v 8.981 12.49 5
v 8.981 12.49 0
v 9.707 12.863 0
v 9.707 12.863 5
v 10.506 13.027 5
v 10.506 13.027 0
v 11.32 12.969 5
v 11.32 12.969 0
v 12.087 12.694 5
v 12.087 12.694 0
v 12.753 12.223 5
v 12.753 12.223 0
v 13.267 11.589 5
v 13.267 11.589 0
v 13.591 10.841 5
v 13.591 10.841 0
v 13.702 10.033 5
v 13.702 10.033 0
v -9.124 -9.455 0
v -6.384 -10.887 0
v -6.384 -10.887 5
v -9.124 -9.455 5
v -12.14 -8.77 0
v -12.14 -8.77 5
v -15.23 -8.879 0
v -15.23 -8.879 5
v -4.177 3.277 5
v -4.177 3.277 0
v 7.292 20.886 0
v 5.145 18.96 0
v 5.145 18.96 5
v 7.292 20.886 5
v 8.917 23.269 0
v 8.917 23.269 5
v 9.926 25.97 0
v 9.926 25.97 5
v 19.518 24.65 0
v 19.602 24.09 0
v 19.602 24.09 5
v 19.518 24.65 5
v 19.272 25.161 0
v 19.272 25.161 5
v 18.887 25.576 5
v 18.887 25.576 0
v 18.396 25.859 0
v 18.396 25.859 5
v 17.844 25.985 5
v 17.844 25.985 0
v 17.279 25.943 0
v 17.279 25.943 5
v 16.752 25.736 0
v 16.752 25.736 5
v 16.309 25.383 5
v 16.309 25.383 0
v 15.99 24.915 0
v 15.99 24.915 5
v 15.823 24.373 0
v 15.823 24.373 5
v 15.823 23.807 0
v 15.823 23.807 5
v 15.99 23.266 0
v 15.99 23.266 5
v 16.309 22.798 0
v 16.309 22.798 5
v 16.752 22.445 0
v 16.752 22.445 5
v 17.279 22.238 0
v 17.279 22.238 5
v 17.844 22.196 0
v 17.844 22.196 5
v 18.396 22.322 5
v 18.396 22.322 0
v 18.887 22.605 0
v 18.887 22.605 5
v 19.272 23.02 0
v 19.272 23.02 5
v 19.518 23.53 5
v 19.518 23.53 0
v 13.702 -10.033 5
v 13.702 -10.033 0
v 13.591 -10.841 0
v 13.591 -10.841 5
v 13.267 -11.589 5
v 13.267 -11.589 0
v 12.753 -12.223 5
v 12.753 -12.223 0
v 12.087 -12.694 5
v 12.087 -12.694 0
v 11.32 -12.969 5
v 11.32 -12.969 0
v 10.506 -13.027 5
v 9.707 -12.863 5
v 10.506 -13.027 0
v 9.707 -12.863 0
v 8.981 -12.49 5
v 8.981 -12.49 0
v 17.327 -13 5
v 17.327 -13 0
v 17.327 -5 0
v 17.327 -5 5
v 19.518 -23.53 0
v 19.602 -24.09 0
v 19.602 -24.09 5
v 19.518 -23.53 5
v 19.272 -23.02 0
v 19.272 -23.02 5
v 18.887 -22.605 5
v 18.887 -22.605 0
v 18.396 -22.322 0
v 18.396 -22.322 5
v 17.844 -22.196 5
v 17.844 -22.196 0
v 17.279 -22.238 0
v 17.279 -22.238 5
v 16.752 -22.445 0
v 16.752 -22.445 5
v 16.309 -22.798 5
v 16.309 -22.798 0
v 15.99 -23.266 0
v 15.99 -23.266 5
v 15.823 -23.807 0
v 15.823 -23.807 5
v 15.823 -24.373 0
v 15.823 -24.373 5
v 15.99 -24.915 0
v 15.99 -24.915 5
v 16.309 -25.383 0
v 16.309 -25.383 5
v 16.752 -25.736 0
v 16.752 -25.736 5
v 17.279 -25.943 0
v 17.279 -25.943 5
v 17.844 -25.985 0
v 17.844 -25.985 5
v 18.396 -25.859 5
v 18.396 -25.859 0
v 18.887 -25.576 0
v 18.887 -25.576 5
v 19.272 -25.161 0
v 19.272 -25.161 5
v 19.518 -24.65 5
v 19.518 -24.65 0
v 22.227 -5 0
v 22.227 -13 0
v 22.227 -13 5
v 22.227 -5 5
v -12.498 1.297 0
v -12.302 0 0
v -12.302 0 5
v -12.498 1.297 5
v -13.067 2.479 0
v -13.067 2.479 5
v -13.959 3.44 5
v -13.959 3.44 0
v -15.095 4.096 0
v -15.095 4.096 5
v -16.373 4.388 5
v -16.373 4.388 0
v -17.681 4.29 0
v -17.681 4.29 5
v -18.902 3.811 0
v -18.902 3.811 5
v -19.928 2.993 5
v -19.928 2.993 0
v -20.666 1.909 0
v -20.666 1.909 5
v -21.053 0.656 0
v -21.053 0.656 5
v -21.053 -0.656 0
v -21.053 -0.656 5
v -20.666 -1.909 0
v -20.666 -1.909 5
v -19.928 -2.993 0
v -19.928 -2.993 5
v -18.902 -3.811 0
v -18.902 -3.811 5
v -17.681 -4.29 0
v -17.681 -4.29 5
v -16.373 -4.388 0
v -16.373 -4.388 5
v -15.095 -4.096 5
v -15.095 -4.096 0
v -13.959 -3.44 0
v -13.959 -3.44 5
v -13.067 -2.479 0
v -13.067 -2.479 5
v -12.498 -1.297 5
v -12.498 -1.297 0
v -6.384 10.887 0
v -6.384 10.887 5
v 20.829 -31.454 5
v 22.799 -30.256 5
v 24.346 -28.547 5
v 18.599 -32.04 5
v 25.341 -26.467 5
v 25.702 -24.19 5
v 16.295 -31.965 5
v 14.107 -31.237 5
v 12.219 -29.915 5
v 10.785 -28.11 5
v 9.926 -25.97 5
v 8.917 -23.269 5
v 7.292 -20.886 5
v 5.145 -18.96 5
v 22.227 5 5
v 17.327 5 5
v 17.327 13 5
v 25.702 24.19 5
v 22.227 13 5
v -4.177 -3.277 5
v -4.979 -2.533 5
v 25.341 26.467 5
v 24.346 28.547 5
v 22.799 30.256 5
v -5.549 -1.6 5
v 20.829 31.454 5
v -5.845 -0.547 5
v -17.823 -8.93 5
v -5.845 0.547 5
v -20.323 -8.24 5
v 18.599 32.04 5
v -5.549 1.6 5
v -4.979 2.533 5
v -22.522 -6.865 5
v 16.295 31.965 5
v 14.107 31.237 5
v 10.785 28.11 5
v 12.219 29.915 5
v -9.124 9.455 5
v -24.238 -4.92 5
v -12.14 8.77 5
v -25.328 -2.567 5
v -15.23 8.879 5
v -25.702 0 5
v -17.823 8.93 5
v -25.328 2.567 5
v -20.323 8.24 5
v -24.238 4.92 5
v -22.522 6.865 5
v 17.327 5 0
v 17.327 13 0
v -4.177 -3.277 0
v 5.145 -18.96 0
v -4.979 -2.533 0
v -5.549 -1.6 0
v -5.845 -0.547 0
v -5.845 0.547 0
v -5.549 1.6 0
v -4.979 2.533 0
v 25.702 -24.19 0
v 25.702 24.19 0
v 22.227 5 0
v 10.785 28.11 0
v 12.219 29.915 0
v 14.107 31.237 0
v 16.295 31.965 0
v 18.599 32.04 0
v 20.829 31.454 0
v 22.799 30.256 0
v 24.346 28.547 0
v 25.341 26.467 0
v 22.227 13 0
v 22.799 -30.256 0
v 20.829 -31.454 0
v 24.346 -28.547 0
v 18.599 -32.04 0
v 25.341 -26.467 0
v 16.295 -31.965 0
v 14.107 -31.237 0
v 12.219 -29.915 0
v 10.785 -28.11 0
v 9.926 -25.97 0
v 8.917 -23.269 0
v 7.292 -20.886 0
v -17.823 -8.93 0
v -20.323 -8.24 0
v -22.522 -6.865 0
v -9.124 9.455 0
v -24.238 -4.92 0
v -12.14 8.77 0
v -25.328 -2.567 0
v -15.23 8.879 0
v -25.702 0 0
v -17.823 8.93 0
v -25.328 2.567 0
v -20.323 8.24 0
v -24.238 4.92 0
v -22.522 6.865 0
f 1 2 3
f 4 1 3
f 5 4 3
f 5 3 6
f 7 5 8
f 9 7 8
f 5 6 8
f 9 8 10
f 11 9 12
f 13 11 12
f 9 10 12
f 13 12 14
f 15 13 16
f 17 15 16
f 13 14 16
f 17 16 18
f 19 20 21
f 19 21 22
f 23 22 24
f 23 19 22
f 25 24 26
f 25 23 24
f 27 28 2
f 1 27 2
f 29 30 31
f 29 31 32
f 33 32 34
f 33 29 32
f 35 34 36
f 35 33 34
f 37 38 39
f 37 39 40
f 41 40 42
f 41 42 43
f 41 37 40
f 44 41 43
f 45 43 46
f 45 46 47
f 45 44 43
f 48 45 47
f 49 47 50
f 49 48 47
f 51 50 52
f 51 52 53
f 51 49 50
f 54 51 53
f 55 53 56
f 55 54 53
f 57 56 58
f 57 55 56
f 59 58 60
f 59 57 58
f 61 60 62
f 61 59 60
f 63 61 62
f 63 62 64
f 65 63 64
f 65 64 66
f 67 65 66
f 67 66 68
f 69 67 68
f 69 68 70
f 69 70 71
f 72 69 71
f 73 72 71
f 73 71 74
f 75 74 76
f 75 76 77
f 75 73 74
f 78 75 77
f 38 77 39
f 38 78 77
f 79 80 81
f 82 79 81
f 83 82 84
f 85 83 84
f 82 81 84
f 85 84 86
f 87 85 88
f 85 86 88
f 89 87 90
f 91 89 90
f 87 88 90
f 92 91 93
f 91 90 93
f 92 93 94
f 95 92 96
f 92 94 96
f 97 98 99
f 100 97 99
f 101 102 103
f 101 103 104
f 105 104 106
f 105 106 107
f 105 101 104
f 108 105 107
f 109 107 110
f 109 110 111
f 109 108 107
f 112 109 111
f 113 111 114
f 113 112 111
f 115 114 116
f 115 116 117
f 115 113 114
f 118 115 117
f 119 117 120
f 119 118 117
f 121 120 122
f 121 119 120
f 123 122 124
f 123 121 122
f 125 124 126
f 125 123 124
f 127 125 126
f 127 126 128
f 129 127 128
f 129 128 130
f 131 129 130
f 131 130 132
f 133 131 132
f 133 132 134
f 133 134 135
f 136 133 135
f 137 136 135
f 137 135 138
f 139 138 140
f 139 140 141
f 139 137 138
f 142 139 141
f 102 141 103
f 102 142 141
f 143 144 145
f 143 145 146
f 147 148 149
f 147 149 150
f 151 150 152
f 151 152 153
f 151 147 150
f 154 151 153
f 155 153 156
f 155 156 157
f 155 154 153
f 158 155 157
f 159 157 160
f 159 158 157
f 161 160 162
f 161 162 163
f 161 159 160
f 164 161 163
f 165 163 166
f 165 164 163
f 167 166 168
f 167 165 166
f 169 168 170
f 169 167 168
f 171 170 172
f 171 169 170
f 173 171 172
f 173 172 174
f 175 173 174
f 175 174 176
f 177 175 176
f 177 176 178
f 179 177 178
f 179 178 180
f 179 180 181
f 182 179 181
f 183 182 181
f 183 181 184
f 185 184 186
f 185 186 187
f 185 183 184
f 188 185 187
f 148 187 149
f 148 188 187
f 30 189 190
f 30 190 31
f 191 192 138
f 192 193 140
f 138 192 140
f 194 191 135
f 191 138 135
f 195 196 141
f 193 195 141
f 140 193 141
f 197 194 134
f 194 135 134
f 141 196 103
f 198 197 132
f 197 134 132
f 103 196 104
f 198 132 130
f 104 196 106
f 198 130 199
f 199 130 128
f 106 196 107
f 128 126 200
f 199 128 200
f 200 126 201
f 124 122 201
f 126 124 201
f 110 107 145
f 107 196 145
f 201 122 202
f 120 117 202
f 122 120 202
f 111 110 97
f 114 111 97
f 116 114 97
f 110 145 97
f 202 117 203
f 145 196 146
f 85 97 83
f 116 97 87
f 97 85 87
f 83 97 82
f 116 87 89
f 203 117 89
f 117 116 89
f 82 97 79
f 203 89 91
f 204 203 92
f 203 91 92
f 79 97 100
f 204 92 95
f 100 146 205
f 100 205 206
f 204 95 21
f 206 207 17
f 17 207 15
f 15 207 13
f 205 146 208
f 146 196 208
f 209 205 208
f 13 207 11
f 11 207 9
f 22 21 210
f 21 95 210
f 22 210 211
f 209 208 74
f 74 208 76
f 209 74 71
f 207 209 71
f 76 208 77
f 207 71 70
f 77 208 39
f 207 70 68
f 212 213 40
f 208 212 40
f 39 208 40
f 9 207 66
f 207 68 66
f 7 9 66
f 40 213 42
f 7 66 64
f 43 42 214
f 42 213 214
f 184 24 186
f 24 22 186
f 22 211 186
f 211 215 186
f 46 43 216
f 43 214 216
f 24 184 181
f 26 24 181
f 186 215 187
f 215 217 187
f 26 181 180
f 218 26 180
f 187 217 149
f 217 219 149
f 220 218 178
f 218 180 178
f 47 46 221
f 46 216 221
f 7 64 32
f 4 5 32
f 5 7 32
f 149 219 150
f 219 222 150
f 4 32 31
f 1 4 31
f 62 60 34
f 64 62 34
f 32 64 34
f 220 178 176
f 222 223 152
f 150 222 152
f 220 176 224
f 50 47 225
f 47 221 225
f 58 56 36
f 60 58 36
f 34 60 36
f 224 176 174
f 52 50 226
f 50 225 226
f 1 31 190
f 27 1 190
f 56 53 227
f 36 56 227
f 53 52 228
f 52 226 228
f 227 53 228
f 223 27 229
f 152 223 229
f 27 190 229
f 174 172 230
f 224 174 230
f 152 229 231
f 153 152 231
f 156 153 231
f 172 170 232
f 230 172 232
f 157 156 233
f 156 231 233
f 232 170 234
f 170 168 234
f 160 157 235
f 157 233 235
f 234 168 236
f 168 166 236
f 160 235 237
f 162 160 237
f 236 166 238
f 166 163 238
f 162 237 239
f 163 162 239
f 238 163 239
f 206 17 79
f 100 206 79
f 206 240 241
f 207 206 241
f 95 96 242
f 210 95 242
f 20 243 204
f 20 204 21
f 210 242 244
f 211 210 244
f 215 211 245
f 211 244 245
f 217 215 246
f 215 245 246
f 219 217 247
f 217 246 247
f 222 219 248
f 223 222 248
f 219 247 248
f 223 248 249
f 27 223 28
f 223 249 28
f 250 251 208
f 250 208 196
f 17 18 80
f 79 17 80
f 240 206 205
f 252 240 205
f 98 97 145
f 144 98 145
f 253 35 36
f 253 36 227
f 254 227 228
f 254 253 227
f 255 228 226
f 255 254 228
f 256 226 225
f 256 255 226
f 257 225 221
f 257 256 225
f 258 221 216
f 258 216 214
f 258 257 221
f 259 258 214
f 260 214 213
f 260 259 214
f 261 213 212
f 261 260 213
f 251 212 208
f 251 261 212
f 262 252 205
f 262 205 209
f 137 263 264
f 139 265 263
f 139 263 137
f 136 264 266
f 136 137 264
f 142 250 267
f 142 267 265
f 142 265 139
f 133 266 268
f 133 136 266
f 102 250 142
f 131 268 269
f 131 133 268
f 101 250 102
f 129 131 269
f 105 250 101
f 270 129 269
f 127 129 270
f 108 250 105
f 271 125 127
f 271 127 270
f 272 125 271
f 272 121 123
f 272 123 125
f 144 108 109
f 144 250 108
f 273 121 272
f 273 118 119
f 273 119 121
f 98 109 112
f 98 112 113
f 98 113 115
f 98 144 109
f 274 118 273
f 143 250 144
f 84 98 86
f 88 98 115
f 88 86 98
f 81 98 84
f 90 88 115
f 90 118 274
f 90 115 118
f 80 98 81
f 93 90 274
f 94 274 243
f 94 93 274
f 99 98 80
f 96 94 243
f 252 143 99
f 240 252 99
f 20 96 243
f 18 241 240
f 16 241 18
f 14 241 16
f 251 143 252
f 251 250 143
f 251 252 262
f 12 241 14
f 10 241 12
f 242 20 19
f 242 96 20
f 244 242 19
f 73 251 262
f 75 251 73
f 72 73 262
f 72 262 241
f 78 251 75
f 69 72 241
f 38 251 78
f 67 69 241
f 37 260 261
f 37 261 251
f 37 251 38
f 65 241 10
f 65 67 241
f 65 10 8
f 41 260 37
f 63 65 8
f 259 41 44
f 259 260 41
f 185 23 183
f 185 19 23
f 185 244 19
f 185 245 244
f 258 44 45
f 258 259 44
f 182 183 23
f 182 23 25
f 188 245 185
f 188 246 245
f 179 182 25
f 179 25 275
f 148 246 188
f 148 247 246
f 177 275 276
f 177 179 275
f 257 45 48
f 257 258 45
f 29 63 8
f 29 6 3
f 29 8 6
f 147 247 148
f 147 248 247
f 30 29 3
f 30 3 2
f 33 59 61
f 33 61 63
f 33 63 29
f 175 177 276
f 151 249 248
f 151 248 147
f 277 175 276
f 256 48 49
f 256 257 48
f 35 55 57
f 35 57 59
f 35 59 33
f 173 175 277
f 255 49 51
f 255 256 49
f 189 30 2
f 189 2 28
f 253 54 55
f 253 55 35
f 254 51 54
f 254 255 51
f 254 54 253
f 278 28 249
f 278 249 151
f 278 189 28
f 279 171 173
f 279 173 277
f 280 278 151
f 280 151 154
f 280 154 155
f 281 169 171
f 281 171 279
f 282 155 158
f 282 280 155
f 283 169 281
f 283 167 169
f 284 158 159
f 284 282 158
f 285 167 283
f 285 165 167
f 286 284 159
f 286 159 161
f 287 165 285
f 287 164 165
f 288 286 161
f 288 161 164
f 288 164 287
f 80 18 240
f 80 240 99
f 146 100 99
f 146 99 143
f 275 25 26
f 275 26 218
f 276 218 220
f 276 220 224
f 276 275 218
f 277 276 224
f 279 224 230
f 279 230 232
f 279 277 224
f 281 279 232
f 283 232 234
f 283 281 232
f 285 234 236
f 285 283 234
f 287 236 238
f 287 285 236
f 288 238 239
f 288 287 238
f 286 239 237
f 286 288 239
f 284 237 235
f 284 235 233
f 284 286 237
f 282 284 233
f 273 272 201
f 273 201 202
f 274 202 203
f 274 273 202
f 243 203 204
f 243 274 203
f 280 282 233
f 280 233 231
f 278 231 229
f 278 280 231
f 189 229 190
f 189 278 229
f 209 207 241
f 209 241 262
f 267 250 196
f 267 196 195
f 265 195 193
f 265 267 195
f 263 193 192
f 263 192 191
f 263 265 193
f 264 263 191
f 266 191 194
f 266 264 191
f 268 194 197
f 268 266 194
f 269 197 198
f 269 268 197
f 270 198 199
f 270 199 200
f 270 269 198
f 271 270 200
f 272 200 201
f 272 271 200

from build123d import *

# Parameters (mm, degrees)
ESQUISSE1_R        = 1.9
ESQUISSE1_R_2      = 4.4
ESQUISSE1_W        = 4.89999982
ESQUISSE1_H        = 8.00000038
BOSS_EXTRU_1_DEPTH = 5


with BuildPart() as part:
    # Esquisse1 → Boss.-Extru.1 (new body)
    with BuildSketch(Plane.XY):
        with BuildLine():
            Line((25.70156774, 24.190208374), (25.70156774, -24.190208374))
            ThreePointArc((25.70156774, -24.190208374), (18.599090239, -32.039774771), (9.926188952, -25.970041455))
            ThreePointArc((9.926188952, -25.970041455), (8.175930594, -22.028307987), (5.145100617, -18.959963694))
            Line((5.145100617, -18.959963694), (-6.383895202, -10.887273587))
            ThreePointArc((-6.383895202, -10.887273587), (-10.60979376, -9.014950874), (-15.229887052, -8.87875638))
            ThreePointArc((-15.229887052, -8.87875638), (-25.702193121, 0), (-15.229887052, 8.87875638))
            ThreePointArc((-15.229887052, 8.87875638), (-10.60979376, 9.014950873), (-6.383895202, 10.887273587))
            Line((-6.383895202, 10.887273587), (5.145100617, 18.959963694))
            ThreePointArc((5.145100617, 18.959963694), (8.175930651, 22.028307983), (9.926189014, 25.970041482))
            ThreePointArc((9.926189014, 25.970041482), (18.59909026, 32.03977477), (25.70156774, 24.190208374))
        make_face()
        with Locations((17.70219274, 24.090210327)):
            Circle(ESQUISSE1_R, mode=Mode.SUBTRACT)
        with Locations((17.70219274, -24.090210327)):
            Circle(ESQUISSE1_R, mode=Mode.SUBTRACT)
        with Locations((-16.70219312, 0)):
            Circle(ESQUISSE1_R_2, mode=Mode.SUBTRACT)
        with BuildLine():
            Line((8.98146324, -12.490403838), (-4.177200867, -3.276608186))
            ThreePointArc((-4.177200867, -3.276608186), (-5.882895134, 0), (-4.177200867, 3.276608186))
            Line((-4.177200867, 3.276608186), (8.98146324, 12.490403838))
            ThreePointArc((8.98146324, 12.490403838), (12.087438212, 12.693980299), (13.70219255, 10.032948107))
            Line((13.70219255, 10.032948107), (13.70219255, -10.032948107))
            ThreePointArc((13.70219255, -10.032948107), (12.087438212, -12.693980299), (8.98146324, -12.490403838))
        make_face(mode=Mode.SUBTRACT)
        with Locations((19.777192636, 9.000000078)):
            Rectangle(ESQUISSE1_W, ESQUISSE1_H, mode=Mode.SUBTRACT)
        with Locations((19.777192636, -9.000000078)):
            Rectangle(ESQUISSE1_W, ESQUISSE1_H, mode=Mode.SUBTRACT)
    extrude(amount=BOSS_EXTRU_1_DEPTH)


solid = part.part
